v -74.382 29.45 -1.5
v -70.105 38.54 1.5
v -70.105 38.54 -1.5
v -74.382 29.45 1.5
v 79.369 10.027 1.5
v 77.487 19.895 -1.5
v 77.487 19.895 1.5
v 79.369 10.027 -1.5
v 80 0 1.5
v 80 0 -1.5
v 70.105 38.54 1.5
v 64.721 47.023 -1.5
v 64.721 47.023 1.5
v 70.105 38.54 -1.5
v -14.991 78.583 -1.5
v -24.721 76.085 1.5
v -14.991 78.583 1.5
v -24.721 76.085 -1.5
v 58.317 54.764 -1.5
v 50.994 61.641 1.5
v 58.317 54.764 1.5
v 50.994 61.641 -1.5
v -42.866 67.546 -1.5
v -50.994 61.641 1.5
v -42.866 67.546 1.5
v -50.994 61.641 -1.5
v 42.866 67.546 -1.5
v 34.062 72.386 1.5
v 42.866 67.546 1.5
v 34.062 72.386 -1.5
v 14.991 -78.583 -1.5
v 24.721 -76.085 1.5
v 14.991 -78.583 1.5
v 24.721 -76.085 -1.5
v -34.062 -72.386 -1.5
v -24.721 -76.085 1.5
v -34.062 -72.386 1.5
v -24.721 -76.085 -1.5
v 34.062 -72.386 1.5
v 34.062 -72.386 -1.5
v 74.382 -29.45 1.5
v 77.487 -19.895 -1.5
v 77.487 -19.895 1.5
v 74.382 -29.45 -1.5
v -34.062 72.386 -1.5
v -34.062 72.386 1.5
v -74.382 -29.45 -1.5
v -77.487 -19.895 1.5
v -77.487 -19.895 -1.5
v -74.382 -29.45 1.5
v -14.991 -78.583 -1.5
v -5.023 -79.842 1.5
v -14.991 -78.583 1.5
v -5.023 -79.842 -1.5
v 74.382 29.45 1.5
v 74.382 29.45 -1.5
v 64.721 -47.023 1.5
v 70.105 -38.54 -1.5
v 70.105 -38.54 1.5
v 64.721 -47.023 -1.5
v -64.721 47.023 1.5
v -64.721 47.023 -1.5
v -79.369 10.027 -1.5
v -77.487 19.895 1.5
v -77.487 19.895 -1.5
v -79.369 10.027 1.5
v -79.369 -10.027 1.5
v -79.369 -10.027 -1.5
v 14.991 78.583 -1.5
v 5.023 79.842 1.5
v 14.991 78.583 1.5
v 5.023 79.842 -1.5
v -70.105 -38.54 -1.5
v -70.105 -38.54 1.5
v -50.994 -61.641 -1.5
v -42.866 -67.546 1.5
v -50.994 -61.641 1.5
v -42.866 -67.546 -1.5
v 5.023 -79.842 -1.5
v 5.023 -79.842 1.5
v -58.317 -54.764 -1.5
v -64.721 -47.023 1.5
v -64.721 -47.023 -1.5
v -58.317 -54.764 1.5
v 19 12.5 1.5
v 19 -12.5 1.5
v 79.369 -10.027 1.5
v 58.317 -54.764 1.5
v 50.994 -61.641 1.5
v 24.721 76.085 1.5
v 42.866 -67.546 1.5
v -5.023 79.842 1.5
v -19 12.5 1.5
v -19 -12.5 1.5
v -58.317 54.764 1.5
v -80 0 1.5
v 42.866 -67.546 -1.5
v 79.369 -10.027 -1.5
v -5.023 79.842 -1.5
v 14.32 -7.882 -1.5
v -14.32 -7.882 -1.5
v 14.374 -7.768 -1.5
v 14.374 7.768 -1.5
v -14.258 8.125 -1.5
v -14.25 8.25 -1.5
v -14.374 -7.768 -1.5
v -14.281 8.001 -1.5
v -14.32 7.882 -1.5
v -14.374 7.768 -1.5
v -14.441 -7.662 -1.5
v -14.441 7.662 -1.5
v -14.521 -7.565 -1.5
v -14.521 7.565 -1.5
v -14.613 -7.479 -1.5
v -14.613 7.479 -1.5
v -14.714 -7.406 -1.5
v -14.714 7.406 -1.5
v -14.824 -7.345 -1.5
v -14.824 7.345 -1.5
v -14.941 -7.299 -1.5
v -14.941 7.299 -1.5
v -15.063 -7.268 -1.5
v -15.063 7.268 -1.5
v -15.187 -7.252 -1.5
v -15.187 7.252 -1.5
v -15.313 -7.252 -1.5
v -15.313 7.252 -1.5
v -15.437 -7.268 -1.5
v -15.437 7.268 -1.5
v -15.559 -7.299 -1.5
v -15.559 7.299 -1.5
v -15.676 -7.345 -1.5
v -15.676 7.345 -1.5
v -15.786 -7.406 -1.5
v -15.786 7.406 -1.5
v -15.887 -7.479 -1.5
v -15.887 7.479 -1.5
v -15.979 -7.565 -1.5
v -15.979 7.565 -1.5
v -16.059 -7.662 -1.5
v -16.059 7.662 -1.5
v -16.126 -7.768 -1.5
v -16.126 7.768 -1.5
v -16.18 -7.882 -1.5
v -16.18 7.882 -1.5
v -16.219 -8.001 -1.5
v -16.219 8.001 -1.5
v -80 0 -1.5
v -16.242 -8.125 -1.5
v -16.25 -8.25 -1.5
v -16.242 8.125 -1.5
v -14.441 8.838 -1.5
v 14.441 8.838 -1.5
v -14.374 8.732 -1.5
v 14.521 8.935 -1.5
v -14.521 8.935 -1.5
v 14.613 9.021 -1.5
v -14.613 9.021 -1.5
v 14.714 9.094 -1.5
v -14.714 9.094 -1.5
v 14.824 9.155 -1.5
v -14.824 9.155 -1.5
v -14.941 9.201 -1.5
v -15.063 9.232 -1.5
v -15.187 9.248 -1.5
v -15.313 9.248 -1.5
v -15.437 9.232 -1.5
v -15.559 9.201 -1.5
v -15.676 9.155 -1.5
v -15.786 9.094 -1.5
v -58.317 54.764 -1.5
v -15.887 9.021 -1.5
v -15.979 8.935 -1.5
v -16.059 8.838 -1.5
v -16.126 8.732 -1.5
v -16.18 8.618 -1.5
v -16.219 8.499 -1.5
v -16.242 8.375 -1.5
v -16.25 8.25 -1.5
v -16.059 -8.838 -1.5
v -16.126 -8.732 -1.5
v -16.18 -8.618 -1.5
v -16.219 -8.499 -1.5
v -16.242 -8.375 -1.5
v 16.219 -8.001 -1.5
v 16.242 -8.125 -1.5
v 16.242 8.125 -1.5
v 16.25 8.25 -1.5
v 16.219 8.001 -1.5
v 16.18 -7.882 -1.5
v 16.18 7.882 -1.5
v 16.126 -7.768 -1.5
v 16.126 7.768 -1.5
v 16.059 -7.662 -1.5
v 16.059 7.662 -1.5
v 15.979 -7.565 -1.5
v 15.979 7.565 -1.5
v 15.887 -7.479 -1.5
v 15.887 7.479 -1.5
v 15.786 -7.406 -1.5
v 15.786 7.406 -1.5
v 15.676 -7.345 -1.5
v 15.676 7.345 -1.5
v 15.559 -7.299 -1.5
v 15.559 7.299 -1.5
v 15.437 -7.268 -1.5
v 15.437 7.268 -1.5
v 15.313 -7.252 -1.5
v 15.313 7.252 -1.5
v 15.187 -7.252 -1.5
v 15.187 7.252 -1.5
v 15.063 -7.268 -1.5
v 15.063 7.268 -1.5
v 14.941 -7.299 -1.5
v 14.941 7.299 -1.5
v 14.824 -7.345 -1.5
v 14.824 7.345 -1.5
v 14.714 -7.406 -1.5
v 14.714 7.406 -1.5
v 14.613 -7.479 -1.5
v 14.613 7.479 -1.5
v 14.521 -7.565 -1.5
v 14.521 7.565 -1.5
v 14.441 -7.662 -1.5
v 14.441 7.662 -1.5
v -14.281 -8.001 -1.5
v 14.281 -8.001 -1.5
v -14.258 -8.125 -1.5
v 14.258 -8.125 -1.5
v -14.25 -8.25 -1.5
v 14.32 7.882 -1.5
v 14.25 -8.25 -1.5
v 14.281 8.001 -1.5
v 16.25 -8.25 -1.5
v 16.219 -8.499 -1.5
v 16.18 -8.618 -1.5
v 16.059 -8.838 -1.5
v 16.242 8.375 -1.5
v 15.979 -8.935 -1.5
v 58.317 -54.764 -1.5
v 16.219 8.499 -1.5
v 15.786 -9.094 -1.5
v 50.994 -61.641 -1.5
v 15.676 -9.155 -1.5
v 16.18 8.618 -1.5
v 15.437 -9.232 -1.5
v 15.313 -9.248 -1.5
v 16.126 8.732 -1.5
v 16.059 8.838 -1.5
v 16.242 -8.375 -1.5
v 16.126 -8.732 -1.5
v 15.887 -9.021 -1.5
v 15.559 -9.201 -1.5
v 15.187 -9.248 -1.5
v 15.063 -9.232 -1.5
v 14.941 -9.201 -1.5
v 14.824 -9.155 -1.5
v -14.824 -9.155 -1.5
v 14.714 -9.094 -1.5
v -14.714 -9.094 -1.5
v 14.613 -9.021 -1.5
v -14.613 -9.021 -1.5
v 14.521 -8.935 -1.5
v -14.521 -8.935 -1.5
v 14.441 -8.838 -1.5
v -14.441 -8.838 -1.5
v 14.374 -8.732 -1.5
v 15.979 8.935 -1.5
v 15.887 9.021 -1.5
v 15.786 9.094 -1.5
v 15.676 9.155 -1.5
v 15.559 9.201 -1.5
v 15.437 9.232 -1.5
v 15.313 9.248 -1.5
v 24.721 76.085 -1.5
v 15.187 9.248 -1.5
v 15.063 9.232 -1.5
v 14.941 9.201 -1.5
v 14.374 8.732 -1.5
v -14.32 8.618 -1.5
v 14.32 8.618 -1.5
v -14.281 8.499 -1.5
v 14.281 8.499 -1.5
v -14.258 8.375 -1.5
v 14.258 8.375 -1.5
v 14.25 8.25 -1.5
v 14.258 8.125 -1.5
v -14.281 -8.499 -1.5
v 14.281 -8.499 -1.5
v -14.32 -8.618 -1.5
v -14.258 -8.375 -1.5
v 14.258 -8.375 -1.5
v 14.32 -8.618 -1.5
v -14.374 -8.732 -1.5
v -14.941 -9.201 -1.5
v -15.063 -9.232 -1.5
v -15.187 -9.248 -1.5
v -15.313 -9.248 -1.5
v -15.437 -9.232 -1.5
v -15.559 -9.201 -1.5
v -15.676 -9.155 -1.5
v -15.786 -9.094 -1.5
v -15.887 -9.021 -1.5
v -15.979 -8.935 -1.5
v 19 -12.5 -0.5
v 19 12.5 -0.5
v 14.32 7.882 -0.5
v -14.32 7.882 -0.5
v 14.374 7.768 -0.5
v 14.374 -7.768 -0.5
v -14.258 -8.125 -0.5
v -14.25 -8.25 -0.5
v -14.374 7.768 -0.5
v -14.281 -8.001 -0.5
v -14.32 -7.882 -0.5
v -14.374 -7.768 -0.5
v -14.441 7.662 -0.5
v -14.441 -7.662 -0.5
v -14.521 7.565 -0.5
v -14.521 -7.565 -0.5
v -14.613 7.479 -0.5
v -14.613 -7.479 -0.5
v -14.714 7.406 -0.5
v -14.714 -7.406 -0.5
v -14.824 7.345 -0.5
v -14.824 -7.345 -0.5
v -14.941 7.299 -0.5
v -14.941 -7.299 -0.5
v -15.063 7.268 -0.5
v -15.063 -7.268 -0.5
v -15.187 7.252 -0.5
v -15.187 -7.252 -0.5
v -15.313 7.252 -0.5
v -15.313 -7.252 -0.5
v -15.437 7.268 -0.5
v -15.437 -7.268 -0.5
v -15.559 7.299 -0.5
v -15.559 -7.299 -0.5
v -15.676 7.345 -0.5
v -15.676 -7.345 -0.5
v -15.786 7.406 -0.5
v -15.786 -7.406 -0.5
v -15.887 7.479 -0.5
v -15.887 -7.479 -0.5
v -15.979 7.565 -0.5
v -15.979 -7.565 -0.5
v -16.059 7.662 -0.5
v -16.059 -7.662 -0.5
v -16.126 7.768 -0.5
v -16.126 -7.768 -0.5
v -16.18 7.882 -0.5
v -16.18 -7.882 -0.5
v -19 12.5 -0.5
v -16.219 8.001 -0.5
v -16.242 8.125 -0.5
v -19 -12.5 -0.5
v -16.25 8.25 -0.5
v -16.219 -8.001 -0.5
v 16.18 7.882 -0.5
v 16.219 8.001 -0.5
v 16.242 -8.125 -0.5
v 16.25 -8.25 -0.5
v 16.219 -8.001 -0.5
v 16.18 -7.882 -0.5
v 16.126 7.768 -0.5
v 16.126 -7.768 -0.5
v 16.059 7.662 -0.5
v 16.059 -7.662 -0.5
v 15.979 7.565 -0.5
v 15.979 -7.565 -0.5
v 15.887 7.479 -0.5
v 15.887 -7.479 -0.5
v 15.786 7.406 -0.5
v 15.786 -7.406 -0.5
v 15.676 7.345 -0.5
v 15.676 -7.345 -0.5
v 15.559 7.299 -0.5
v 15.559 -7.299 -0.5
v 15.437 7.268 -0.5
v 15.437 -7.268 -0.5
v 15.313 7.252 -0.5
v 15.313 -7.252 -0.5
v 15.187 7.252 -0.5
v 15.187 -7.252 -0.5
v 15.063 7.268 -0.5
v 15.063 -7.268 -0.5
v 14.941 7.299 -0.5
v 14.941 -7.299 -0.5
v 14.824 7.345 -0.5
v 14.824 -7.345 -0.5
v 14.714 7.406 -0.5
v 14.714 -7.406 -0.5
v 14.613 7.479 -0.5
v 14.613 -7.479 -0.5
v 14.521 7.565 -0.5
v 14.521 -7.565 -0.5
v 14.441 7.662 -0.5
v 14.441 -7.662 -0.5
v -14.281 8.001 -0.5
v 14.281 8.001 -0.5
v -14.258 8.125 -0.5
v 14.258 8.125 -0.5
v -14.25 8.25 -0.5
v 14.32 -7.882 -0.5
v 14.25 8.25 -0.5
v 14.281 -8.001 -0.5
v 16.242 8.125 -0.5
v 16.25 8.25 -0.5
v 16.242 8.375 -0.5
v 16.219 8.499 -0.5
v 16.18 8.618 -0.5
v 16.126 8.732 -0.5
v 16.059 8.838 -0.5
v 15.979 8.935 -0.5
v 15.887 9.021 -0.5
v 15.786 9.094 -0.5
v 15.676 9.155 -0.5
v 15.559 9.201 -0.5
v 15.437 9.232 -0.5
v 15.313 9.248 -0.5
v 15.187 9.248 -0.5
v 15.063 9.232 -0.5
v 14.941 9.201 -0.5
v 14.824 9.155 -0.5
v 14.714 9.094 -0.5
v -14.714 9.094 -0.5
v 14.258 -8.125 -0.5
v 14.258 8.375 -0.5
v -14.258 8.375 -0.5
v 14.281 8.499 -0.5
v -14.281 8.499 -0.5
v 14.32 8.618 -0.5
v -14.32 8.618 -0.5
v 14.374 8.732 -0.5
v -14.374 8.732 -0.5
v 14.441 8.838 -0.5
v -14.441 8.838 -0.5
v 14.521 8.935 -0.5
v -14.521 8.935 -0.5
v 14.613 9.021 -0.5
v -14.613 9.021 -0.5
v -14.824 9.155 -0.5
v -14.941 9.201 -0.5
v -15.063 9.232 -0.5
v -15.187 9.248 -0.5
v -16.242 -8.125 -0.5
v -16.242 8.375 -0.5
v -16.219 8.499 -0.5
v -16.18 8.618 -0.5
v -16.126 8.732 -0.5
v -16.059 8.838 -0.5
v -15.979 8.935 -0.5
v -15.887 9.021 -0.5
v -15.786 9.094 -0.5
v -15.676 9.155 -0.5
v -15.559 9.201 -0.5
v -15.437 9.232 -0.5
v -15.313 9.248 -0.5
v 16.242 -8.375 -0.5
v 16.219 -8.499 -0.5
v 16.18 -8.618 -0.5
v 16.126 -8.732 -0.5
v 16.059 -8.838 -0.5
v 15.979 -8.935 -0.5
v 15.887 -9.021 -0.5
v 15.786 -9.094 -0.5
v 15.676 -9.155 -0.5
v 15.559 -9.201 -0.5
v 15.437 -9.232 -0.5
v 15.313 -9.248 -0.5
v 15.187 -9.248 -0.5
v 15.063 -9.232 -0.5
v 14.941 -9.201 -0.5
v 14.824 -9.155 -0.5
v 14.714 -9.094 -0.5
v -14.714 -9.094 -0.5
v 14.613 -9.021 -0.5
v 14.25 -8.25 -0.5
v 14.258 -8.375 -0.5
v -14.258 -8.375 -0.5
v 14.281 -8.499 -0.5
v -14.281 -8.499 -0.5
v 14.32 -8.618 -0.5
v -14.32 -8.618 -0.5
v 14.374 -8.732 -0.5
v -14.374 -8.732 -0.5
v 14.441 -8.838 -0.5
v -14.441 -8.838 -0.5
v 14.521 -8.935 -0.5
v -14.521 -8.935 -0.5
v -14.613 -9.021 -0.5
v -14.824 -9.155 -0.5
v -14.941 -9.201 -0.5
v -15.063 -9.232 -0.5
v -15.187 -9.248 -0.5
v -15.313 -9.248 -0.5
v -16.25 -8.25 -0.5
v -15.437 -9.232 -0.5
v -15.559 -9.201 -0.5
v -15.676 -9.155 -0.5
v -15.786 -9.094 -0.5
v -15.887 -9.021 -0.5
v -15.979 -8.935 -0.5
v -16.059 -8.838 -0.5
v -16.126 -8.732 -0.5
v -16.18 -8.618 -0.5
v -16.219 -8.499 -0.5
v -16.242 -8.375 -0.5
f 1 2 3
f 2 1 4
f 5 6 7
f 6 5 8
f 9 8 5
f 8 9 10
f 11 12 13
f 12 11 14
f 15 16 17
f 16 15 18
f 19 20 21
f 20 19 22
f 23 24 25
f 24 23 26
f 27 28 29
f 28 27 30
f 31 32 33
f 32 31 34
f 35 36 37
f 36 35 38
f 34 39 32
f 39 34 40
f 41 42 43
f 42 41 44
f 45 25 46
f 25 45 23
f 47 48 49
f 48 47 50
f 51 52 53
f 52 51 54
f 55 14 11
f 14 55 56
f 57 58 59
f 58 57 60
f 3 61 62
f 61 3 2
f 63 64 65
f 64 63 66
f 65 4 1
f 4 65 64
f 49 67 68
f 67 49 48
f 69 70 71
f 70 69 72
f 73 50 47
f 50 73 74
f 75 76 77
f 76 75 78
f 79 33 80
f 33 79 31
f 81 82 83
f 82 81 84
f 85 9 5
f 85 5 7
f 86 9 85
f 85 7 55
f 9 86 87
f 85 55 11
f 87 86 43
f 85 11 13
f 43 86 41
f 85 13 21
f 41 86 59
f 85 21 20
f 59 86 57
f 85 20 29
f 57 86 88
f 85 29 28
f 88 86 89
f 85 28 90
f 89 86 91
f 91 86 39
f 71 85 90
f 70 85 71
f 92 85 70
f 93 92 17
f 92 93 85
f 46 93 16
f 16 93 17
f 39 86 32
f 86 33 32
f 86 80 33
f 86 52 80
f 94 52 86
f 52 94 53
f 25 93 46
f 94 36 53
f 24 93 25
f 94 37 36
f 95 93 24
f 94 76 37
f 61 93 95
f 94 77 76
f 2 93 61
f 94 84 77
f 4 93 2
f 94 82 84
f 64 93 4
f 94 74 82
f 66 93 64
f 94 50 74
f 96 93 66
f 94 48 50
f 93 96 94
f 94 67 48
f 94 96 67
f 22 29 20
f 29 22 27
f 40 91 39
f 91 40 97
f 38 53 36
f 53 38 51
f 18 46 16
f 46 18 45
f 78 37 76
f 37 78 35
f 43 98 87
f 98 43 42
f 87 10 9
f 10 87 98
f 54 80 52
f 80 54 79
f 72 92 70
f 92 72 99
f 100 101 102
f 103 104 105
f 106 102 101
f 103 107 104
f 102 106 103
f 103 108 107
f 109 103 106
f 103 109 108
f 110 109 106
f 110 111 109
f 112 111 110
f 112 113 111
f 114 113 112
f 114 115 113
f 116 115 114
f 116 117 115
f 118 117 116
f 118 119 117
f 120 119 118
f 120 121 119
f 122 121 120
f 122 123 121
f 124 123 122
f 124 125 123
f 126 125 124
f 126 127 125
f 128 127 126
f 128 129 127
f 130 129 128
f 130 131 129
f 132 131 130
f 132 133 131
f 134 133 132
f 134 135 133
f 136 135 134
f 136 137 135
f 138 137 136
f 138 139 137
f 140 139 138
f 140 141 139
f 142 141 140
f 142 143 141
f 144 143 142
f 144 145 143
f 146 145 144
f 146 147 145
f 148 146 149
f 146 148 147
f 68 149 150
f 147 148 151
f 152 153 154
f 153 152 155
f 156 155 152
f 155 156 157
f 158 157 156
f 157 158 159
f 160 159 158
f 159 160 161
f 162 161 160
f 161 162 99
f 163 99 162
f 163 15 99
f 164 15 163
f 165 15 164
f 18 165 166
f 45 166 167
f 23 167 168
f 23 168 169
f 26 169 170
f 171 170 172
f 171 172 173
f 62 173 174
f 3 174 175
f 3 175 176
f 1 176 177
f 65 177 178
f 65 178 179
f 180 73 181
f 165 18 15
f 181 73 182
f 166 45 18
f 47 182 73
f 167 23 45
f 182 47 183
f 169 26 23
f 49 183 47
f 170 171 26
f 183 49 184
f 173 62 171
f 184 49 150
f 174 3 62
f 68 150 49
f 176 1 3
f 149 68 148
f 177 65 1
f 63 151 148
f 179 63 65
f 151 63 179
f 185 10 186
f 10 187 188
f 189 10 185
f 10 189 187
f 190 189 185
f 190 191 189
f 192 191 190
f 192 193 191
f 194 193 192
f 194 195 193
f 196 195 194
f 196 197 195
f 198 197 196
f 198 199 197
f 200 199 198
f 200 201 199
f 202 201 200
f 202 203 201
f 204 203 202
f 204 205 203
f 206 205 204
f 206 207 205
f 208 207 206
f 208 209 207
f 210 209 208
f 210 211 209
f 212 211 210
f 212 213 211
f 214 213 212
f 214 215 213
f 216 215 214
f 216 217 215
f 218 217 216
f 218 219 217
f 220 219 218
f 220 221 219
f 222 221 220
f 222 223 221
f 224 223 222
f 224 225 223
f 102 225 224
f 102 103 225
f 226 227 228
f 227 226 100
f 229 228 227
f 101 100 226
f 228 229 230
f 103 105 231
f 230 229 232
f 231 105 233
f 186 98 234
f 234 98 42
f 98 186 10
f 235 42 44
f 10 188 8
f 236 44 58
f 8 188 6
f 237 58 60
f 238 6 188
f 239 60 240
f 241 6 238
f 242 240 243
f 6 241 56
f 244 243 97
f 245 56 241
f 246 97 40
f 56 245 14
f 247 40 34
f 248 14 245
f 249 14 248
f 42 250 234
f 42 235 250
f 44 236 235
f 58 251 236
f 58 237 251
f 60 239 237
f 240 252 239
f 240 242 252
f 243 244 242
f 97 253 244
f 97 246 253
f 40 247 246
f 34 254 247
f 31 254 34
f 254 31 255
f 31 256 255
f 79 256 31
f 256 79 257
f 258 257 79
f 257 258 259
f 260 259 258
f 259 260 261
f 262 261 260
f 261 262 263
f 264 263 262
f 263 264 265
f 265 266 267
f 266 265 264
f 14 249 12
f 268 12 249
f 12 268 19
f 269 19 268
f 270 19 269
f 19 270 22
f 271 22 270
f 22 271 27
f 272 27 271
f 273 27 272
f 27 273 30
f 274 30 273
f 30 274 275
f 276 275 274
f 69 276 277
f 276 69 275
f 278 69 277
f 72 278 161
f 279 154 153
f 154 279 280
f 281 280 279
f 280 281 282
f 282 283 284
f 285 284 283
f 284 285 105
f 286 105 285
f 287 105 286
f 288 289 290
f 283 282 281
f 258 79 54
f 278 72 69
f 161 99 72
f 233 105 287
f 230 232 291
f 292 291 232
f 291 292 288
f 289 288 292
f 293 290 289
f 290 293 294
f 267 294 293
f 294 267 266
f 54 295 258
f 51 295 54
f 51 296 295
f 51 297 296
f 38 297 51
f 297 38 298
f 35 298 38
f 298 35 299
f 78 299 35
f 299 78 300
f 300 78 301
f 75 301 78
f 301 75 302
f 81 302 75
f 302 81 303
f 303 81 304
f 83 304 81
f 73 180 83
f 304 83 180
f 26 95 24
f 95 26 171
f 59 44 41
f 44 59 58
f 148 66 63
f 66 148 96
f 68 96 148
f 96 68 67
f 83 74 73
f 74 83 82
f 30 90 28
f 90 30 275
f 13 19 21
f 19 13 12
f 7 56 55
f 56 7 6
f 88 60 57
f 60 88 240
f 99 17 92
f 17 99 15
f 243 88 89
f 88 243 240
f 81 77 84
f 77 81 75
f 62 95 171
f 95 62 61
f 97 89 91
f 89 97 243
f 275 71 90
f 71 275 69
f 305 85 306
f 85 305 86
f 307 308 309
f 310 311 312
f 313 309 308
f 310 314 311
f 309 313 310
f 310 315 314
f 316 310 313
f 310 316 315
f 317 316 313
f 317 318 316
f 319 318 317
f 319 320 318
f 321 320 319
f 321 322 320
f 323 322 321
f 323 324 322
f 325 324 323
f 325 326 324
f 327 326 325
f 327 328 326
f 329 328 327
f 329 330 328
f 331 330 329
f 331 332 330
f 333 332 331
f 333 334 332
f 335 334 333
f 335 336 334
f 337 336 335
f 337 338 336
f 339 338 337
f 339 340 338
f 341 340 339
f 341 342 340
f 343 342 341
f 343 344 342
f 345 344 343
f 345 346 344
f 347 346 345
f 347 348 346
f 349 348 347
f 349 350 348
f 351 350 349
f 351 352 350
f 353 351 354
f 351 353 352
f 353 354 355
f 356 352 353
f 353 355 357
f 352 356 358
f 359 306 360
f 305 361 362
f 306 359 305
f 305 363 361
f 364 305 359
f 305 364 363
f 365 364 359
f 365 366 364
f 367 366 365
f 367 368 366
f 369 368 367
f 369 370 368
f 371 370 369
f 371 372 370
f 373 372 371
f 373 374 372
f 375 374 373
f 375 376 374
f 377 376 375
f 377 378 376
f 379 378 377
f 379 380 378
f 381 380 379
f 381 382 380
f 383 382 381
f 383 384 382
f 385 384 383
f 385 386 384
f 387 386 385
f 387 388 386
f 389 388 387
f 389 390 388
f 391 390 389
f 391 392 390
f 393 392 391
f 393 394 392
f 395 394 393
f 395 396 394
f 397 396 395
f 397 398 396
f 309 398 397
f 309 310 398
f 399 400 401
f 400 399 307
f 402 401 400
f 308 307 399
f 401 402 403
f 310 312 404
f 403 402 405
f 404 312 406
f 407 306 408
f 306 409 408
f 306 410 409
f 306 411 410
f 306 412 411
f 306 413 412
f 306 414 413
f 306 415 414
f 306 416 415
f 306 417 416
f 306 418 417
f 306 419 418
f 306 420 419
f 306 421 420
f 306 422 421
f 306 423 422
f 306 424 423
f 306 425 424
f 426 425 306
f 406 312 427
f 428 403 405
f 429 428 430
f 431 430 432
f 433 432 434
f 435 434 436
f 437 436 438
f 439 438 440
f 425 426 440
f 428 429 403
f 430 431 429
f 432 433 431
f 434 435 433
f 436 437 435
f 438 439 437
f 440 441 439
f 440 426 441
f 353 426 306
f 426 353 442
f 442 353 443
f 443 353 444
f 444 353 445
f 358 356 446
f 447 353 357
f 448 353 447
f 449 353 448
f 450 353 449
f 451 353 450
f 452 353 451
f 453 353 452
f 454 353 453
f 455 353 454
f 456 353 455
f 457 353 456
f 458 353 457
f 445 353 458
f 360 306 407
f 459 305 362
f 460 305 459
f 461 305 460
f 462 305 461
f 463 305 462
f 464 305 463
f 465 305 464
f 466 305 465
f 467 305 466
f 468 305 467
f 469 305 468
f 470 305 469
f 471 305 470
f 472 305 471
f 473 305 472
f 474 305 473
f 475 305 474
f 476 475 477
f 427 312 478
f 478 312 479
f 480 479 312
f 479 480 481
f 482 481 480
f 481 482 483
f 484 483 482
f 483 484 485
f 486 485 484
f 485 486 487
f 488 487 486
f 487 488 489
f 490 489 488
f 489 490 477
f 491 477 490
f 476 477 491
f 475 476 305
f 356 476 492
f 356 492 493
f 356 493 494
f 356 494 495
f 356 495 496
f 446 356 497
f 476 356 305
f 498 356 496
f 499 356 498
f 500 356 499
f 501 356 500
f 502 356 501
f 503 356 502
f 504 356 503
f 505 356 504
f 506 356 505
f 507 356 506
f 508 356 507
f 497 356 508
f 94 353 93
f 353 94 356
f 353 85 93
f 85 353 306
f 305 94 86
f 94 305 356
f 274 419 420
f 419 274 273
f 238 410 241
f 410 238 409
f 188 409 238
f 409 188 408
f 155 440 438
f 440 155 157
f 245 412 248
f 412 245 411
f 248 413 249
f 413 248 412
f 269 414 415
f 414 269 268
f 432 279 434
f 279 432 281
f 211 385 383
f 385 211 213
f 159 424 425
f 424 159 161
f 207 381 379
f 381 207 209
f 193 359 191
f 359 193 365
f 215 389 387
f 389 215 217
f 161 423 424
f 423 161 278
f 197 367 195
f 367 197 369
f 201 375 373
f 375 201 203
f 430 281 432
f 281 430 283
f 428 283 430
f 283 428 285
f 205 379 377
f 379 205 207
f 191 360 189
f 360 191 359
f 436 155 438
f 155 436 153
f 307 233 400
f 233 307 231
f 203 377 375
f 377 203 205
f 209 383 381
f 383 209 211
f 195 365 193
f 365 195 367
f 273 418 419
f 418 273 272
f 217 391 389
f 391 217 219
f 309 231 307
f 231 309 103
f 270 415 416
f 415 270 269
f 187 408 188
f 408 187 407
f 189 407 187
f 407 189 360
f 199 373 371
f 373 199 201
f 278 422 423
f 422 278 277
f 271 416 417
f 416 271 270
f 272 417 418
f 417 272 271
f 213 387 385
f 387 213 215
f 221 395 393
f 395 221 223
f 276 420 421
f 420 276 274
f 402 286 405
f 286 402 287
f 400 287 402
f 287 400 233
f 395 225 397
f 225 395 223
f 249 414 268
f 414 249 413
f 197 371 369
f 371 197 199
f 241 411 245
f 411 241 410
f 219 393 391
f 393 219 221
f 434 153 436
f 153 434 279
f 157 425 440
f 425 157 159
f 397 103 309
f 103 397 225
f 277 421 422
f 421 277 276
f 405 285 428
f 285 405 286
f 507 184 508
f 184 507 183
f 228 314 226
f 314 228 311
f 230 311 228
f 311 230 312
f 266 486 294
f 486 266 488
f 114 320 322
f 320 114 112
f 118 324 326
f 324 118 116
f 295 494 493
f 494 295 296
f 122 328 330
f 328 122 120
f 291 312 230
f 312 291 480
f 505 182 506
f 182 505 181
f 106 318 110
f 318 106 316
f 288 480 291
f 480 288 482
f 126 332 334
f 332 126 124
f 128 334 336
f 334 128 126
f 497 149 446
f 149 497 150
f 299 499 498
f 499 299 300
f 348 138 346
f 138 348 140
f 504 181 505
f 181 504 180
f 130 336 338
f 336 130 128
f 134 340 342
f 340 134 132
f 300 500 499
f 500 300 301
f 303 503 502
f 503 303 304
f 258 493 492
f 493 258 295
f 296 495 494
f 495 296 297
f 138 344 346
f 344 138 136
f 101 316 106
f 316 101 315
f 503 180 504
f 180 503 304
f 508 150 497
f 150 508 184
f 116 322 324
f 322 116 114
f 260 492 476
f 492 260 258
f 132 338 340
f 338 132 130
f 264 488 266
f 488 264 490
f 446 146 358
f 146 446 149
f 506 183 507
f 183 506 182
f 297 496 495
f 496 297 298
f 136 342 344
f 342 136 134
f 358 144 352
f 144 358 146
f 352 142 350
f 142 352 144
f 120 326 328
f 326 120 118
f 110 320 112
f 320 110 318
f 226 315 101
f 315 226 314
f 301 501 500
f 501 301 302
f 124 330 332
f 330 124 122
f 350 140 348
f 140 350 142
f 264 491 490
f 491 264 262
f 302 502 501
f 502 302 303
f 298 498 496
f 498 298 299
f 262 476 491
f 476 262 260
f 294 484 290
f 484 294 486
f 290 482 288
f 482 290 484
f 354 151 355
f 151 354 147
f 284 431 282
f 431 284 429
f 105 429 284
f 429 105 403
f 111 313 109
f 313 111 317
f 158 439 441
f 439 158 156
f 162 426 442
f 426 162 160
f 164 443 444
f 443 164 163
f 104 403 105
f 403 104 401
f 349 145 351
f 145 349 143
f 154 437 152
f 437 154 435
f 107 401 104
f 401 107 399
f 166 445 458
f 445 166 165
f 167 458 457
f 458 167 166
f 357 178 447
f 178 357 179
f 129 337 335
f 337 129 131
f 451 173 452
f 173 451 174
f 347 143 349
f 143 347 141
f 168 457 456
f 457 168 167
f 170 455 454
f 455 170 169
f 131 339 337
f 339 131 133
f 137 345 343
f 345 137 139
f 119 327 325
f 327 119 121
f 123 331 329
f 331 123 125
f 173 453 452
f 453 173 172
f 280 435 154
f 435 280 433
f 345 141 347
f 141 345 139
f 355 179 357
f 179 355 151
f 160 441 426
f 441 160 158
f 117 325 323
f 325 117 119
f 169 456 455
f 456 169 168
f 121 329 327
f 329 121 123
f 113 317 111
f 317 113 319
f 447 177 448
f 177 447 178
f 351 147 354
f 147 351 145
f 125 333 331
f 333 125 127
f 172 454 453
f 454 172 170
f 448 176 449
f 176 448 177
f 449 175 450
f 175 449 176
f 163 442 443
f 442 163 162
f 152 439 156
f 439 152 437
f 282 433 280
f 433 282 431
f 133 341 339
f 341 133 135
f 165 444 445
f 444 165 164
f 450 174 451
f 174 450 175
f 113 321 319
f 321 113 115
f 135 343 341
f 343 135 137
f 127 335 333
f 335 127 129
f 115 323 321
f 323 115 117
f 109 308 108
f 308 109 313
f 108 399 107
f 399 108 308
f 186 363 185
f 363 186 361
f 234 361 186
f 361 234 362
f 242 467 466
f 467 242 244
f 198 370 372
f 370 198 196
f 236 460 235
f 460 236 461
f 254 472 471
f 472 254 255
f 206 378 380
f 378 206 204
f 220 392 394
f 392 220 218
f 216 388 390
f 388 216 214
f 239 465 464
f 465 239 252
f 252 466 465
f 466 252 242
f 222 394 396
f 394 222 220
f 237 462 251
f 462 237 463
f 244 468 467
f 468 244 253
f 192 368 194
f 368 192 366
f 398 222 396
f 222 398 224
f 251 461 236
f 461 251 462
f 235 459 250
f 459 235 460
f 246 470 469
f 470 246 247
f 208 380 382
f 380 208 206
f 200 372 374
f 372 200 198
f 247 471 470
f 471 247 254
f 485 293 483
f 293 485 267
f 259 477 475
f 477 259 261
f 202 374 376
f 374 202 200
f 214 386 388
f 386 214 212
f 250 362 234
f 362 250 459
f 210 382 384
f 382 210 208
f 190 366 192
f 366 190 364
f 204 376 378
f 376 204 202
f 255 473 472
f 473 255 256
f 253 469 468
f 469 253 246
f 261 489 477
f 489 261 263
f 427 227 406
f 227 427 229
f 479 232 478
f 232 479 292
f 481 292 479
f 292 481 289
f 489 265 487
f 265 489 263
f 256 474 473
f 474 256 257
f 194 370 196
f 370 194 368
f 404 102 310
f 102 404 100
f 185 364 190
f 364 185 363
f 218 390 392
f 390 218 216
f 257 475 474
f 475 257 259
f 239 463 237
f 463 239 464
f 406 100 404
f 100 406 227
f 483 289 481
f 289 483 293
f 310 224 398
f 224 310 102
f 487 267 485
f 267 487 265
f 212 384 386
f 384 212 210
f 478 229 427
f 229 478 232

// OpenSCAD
$fn=50;
difference(){
cylinder(h=3,r=80,center=true);

    translate([0,0,1])
cube([38, 25, 3], center=true);

    translate([15.25, 8.25, 0])
cylinder(h=5,r=1,center=true);
    translate([-15.25,-8.25,0])
cylinder(h=5,r=1,center=true);
    translate([-15.25,8.25,0])
cylinder(h=5,r=1,center=true);
    translate([15.25,-8.25,0])
cylinder(h=5,r=1,center=true);
}
